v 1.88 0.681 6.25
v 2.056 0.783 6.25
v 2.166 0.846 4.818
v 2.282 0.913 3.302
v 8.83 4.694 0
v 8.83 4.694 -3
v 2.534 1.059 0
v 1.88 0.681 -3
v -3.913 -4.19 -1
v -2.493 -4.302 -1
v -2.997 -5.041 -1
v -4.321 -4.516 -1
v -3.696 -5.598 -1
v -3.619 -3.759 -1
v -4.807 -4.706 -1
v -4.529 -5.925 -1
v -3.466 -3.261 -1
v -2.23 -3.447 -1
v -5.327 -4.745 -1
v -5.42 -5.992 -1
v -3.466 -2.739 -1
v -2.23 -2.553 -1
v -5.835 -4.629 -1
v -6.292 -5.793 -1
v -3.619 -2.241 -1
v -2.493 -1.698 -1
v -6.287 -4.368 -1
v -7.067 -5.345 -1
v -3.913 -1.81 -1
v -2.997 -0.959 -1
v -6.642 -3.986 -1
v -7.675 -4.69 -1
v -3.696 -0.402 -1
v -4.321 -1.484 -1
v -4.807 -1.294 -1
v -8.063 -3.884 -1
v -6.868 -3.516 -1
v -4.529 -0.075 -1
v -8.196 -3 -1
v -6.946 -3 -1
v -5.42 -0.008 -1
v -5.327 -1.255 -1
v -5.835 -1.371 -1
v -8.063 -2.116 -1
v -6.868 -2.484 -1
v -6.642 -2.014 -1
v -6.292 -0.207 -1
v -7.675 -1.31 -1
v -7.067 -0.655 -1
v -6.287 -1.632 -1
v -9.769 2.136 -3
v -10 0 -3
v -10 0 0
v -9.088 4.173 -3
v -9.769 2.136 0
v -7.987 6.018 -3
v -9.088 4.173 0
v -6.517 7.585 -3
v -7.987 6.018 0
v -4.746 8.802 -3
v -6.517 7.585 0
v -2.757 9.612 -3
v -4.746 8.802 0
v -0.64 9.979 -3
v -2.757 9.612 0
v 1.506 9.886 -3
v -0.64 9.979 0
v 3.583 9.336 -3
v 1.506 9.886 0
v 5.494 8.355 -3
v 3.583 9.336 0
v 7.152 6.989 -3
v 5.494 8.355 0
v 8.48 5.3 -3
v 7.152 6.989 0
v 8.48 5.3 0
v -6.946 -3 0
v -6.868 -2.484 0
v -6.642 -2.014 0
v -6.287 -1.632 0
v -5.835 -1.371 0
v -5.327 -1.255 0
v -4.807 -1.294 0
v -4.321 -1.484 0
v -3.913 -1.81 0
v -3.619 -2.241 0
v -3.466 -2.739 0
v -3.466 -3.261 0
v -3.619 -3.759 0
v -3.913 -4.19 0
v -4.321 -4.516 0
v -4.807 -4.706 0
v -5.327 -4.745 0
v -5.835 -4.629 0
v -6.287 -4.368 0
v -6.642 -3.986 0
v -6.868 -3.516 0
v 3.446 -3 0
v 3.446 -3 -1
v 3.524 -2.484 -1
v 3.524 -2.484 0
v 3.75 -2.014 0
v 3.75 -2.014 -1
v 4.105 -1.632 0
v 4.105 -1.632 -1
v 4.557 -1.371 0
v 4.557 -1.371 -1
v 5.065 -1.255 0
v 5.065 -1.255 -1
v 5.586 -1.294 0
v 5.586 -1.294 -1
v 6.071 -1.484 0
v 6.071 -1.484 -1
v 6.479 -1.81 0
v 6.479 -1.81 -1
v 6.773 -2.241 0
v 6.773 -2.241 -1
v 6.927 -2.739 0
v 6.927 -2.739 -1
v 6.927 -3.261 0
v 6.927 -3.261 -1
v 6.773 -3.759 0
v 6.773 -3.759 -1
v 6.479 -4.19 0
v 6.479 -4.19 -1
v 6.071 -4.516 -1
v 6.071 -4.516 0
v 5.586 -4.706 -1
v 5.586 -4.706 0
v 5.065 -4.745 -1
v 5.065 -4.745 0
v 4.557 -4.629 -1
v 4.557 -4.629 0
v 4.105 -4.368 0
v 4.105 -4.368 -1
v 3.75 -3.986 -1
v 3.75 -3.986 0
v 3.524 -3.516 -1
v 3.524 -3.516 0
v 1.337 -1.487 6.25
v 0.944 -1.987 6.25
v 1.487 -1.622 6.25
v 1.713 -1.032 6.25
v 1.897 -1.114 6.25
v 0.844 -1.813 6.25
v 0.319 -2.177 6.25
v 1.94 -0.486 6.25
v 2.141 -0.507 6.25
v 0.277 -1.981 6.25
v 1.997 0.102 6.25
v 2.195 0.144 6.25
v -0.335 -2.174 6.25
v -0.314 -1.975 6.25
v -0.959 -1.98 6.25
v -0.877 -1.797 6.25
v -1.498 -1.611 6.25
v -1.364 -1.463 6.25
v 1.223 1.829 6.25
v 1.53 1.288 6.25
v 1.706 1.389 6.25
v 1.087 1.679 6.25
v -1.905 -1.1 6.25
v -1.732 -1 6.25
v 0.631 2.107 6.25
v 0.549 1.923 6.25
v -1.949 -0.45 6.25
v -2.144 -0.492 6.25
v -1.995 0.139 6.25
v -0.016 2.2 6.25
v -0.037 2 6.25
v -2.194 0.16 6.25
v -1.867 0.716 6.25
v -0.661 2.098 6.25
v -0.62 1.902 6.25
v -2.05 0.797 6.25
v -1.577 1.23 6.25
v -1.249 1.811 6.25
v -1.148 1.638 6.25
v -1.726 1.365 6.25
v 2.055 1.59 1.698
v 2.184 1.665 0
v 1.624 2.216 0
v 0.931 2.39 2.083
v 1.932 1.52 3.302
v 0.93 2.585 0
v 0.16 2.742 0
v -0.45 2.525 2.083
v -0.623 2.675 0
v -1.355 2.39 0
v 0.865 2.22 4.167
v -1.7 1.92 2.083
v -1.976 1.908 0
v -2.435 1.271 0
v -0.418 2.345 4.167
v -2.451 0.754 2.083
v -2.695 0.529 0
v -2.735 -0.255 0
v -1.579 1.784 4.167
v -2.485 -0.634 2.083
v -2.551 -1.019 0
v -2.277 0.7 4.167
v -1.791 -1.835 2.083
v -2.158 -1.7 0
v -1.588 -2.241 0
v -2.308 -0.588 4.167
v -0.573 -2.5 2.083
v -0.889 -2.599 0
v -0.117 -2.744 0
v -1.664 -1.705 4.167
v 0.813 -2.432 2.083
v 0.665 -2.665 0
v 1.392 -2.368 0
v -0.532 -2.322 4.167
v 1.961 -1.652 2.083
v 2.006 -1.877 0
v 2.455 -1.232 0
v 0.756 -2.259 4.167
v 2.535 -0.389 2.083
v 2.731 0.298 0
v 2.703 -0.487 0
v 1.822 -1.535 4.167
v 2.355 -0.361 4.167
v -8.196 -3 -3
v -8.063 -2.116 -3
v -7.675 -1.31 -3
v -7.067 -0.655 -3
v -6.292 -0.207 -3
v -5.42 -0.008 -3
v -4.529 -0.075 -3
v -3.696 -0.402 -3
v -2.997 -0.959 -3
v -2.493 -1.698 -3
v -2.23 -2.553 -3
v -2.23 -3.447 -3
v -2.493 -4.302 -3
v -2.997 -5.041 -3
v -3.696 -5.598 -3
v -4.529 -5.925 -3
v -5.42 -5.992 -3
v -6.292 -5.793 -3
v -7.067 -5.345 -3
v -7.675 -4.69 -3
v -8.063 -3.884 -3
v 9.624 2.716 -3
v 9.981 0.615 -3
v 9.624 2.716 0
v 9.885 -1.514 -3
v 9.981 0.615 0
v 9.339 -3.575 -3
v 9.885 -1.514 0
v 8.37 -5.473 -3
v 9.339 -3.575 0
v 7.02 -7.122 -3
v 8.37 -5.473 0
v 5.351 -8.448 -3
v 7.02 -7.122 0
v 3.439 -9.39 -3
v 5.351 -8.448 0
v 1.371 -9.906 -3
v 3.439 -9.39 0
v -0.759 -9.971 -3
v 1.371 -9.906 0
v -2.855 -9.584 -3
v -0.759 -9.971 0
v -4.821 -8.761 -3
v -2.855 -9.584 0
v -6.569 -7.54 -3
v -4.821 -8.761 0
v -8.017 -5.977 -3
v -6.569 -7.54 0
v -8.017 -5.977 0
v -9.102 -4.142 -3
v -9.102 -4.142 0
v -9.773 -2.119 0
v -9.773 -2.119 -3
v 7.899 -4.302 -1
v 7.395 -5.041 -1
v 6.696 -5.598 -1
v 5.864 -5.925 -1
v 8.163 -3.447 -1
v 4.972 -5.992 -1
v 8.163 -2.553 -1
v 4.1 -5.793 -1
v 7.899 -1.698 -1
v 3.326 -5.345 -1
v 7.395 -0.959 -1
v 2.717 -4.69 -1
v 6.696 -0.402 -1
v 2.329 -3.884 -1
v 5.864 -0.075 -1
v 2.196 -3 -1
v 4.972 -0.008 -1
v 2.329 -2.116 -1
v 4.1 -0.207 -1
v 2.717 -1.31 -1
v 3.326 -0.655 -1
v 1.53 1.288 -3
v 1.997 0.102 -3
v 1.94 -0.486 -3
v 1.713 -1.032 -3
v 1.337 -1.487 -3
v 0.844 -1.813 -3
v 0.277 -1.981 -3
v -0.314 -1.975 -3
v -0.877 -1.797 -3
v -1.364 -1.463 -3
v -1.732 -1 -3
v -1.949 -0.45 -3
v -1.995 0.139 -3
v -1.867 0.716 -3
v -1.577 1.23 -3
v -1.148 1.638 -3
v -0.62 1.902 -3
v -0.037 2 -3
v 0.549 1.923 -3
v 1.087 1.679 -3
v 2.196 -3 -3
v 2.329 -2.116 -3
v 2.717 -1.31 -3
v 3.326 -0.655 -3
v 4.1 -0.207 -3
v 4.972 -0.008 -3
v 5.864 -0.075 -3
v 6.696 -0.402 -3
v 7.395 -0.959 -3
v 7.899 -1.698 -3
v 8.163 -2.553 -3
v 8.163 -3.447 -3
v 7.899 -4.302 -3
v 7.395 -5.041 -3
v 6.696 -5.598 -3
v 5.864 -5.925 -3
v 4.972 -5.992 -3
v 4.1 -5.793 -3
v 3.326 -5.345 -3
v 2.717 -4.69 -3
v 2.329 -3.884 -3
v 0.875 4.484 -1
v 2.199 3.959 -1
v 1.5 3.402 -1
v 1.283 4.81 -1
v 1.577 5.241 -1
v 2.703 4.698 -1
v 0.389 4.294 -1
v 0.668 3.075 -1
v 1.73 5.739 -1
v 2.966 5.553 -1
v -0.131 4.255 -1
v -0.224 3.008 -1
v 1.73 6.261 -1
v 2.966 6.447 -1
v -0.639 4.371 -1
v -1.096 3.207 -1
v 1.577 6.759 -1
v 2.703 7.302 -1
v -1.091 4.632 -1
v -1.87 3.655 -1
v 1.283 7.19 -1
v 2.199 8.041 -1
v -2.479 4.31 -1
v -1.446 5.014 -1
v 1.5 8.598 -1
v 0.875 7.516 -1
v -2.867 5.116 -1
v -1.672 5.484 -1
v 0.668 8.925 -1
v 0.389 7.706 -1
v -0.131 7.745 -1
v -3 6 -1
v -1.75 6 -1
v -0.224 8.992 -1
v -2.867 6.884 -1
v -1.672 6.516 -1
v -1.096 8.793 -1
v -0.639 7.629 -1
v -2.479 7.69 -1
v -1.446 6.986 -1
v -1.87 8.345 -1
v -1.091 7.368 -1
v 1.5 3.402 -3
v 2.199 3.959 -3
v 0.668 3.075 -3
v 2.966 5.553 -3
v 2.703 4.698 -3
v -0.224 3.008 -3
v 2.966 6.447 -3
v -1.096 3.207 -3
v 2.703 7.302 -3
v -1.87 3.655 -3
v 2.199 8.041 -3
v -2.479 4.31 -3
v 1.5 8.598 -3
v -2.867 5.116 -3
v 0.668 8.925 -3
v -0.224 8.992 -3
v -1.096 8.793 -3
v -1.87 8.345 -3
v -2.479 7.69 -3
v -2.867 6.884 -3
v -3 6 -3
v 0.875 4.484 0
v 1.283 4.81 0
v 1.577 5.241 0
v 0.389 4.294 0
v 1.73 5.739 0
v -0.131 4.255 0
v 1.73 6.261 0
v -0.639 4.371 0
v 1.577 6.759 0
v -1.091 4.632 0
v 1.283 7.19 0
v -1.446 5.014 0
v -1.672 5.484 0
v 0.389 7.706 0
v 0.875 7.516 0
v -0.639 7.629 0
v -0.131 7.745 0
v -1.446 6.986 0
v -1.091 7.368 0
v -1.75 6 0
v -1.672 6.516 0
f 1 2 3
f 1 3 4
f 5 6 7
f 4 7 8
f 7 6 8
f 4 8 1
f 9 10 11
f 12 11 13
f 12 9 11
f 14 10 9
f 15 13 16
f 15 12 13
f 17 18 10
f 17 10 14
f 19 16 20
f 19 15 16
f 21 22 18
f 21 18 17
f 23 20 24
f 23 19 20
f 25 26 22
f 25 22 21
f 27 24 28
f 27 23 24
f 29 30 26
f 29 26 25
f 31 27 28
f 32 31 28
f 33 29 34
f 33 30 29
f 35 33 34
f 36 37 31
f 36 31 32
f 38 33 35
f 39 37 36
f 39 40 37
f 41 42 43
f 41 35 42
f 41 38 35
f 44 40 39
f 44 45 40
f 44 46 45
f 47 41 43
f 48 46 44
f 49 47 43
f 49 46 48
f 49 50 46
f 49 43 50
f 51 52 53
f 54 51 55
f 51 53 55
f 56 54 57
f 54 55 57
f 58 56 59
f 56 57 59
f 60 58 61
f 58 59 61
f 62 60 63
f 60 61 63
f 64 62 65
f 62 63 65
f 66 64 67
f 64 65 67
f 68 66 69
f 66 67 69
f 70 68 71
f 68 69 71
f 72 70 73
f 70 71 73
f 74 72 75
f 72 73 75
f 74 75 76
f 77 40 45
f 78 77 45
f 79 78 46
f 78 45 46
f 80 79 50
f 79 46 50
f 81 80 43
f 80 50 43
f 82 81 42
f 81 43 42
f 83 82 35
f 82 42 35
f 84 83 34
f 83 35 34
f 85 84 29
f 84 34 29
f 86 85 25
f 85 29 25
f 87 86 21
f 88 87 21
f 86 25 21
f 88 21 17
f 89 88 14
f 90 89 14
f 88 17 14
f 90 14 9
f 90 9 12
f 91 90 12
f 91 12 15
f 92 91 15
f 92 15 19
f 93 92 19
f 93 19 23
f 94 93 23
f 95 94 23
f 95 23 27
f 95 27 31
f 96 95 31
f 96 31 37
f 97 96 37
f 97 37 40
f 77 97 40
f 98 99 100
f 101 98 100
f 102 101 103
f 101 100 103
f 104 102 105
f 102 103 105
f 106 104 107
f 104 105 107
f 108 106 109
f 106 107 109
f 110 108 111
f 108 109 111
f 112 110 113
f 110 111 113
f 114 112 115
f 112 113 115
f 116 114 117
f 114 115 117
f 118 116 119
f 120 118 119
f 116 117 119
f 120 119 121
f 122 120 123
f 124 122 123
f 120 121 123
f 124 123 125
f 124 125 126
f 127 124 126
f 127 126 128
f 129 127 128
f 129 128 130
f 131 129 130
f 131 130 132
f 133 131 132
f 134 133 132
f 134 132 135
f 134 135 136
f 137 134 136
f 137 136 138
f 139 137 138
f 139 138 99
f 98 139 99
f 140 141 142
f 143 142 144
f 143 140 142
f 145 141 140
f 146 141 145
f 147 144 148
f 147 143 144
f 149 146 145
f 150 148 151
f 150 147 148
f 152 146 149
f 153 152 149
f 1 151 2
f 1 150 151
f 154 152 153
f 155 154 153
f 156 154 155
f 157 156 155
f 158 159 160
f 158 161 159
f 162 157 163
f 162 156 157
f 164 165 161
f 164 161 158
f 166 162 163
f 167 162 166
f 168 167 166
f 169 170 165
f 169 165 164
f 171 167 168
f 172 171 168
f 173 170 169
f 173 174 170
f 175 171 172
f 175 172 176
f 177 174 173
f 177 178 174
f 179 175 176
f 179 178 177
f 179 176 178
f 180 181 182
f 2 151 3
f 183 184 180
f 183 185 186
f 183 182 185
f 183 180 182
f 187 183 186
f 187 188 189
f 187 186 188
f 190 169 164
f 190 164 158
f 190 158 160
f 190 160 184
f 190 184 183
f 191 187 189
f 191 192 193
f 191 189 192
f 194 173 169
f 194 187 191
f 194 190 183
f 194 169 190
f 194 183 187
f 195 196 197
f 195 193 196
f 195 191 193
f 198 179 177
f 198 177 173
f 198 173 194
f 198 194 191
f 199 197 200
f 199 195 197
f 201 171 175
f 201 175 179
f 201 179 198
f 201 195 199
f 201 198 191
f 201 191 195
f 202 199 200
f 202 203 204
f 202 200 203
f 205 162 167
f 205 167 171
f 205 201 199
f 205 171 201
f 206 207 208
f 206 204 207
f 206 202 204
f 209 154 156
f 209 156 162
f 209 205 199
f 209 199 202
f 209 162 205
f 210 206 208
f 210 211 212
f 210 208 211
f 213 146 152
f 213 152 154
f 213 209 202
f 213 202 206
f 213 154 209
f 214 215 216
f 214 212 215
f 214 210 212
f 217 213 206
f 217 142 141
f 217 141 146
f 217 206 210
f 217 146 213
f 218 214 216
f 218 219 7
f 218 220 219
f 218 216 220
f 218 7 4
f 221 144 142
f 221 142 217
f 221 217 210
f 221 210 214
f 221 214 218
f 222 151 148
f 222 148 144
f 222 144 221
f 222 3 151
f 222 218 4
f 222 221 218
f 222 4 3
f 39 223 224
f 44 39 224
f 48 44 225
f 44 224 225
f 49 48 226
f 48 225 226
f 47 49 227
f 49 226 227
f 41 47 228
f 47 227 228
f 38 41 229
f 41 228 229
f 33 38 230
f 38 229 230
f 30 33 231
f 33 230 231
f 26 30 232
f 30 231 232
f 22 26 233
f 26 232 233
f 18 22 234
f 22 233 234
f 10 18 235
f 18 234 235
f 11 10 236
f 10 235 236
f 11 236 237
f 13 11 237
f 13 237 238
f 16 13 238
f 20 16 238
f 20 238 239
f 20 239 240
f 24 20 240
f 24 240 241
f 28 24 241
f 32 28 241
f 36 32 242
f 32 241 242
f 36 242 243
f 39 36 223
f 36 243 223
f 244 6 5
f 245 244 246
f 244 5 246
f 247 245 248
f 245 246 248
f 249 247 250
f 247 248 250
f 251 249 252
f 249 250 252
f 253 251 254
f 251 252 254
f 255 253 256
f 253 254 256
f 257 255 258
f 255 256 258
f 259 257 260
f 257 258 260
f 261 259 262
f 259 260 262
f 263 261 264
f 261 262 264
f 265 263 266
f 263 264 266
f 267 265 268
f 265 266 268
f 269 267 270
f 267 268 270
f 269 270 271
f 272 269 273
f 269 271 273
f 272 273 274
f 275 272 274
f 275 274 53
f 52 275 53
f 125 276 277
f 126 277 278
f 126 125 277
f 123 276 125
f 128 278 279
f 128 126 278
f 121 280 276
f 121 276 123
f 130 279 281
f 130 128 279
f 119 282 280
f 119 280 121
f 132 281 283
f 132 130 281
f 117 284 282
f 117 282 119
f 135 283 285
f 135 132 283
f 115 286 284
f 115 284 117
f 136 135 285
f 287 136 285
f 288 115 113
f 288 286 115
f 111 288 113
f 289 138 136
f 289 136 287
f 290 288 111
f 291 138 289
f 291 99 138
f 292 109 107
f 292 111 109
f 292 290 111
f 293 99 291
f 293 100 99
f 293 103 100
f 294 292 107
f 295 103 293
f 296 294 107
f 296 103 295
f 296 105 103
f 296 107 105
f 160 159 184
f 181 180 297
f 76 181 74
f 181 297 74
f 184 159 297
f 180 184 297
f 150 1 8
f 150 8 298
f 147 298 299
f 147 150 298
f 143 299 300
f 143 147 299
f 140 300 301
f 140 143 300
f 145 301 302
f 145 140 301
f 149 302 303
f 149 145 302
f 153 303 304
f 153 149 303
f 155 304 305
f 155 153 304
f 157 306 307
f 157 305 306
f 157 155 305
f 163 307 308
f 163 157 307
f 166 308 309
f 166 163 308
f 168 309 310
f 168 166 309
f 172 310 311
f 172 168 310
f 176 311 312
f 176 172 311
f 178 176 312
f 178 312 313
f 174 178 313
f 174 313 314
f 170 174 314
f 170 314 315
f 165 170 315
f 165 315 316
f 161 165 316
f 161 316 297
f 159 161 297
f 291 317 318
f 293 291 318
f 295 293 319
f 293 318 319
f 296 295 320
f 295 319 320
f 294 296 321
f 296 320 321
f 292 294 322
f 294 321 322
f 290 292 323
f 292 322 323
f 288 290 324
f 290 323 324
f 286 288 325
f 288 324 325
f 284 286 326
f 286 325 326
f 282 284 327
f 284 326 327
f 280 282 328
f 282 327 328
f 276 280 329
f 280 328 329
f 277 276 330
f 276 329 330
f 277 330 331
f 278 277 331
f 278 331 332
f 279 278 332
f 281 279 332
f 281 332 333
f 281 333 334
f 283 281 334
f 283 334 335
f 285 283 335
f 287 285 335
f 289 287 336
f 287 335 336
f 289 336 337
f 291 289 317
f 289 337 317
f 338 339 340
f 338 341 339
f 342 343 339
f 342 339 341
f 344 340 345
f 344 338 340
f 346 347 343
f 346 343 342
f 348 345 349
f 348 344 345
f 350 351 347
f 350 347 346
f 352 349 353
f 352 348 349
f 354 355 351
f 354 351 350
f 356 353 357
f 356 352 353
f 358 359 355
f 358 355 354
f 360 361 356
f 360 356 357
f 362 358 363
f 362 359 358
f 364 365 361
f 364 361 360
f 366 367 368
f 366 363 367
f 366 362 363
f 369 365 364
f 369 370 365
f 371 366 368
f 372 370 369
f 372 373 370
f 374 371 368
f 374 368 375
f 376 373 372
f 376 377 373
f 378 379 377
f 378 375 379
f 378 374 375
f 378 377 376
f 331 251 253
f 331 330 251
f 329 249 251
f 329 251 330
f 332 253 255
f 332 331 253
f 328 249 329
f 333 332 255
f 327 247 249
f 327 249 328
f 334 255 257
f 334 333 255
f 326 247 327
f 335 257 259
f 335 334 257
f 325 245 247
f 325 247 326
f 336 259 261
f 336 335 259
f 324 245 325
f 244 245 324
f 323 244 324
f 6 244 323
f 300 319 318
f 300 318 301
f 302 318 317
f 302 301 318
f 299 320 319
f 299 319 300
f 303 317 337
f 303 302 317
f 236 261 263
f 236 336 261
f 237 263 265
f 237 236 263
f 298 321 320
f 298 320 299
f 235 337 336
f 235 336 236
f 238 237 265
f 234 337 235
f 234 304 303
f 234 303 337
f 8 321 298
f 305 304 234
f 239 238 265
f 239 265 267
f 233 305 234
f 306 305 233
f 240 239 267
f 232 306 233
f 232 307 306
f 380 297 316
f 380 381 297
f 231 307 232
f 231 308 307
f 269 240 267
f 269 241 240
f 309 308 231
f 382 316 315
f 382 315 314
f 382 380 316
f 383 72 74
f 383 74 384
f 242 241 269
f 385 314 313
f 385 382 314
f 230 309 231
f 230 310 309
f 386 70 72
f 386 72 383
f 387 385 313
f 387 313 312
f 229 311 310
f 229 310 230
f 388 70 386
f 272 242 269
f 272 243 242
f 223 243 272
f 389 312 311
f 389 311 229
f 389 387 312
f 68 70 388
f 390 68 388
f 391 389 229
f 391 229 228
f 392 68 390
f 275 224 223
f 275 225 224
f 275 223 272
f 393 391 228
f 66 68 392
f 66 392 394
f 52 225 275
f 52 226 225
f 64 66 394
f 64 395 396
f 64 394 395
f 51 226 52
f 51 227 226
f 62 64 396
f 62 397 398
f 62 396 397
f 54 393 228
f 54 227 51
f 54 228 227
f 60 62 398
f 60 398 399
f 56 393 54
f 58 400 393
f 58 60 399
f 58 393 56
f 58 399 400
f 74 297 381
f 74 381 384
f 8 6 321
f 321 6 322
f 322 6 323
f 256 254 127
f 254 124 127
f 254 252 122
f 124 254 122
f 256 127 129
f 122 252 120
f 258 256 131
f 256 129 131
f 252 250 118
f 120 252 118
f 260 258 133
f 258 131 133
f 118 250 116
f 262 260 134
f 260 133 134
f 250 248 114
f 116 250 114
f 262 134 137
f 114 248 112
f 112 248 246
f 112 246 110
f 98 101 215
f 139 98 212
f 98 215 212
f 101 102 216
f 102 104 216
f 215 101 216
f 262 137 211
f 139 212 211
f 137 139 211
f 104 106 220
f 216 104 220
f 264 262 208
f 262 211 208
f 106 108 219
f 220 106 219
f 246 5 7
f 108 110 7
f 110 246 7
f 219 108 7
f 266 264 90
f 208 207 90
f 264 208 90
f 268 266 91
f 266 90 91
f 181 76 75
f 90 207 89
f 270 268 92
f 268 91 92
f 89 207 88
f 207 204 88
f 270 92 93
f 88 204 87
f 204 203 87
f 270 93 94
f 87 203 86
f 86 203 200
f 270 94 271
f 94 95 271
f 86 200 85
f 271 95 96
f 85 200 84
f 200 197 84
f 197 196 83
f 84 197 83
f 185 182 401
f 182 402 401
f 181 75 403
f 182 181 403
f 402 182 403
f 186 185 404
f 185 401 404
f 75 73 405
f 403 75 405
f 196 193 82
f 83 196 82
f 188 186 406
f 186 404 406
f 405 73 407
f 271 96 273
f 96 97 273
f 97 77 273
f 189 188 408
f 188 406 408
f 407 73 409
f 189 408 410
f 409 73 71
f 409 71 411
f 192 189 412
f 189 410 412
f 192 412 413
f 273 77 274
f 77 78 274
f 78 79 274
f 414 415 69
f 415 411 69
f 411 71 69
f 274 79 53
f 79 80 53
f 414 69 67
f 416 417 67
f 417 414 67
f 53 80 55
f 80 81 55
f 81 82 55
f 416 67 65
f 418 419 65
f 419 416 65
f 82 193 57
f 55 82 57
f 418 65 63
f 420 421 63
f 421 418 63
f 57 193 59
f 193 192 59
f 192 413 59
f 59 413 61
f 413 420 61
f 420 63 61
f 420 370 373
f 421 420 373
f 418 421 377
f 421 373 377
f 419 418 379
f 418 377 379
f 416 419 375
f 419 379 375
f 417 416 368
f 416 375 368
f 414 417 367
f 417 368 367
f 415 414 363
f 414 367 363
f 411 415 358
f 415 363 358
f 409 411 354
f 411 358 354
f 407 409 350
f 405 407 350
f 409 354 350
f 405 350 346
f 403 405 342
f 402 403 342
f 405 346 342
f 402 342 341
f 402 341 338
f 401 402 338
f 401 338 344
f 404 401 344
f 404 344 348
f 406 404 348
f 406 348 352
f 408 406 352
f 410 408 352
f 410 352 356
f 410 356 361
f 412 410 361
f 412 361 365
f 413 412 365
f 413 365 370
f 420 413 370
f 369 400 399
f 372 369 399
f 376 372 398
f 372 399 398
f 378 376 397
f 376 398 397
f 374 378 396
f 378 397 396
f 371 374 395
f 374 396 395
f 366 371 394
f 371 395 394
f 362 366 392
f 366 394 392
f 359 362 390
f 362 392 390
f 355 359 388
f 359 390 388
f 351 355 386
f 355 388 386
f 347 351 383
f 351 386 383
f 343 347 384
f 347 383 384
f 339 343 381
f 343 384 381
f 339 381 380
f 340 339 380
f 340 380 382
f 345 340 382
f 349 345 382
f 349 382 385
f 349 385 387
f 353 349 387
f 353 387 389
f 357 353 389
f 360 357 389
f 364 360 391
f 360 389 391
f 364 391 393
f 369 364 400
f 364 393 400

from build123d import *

# Parameters (mm, degrees)
SKETCH4_R           = 10
SKETCH4_R_2         = 2
BOSS_EXTRUDE4_DEPTH = 3
SKETCH5_R           = 1.75
CUT_EXTRUDE1_DEPTH  = 10.25
SKETCH7_R           = 3
CUT_EXTRUDE3_DEPTH  = 2
CUT_EXTRUDE2_DEPTH  = 10.25


with BuildPart() as part:
    # Sketch3 → Revolve1 (revolve)
    with BuildSketch(Plane(origin=(0, 0, 0), x_dir=(0, 0, -1), z_dir=(1, 0, 0))):
        Polygon((0, 2), (0, 2.746804147), (-6.25, 2.2), (-6.25, 2), align=None)
    revolve(axis=Axis((0, 0, 0), (0, 0, 1)))

    # Sketch4 → Boss-Extrude4 (add)
    with BuildSketch(Plane(origin=(0, 0, 0), x_dir=(-1, 0, 0), z_dir=(0, 0, -1))):
        Circle(SKETCH4_R)
        Circle(SKETCH4_R_2, mode=Mode.SUBTRACT)
    extrude(amount=BOSS_EXTRUDE4_DEPTH)

    # Sketch5 → Cut-Extrude1 (cut, through all)
    with BuildSketch(Plane(origin=(0, 0, -3), x_dir=(-1, 0, 0), z_dir=(0, 0, -1))):
        with Locations((0, 6)):
            Circle(SKETCH5_R)
        with Locations((-5.196152423, -3)):
            Circle(SKETCH5_R)
        with Locations((5.196152423, -3)):
            Circle(SKETCH5_R)
    extrude(amount=-CUT_EXTRUDE1_DEPTH, mode=Mode.SUBTRACT)

    # Sketch7 → Cut-Extrude3 (cut)
    with BuildSketch(Plane(origin=(0, 0, -3), x_dir=(-1, 0, 0), z_dir=(0, 0, -1))):
        with Locations((0, 6)):
            Circle(SKETCH7_R)
        with Locations((5.196152423, -3)):
            Circle(SKETCH7_R)
        with Locations((-5.196152423, -3)):
            Circle(SKETCH7_R)
    extrude(amount=-CUT_EXTRUDE3_DEPTH, mode=Mode.SUBTRACT)

    # Sketch6 → Cut-Extrude2 (cut, through all)
    with BuildSketch(Plane(origin=(0, 0, -3), x_dir=(-1, 0, 0), z_dir=(0, 0, -1))):
        with BuildLine():
            Line((-8.829948007, 4.69382767), (-0.175, -0.303108891))
            Line((-0.175, -0.303108891), (0, 0))
            Line((0, 0), (0.175, 0.303108891))
            Line((0.175, 0.303108891), (-8.479948007, 5.300045453))
            ThreePointArc((-8.479948007, 5.300045453), (-8.660254038, 5), (-8.829948007, 4.69382767))
        make_face()
    extrude(amount=-CUT_EXTRUDE2_DEPTH, mode=Mode.SUBTRACT)


solid = part.part
